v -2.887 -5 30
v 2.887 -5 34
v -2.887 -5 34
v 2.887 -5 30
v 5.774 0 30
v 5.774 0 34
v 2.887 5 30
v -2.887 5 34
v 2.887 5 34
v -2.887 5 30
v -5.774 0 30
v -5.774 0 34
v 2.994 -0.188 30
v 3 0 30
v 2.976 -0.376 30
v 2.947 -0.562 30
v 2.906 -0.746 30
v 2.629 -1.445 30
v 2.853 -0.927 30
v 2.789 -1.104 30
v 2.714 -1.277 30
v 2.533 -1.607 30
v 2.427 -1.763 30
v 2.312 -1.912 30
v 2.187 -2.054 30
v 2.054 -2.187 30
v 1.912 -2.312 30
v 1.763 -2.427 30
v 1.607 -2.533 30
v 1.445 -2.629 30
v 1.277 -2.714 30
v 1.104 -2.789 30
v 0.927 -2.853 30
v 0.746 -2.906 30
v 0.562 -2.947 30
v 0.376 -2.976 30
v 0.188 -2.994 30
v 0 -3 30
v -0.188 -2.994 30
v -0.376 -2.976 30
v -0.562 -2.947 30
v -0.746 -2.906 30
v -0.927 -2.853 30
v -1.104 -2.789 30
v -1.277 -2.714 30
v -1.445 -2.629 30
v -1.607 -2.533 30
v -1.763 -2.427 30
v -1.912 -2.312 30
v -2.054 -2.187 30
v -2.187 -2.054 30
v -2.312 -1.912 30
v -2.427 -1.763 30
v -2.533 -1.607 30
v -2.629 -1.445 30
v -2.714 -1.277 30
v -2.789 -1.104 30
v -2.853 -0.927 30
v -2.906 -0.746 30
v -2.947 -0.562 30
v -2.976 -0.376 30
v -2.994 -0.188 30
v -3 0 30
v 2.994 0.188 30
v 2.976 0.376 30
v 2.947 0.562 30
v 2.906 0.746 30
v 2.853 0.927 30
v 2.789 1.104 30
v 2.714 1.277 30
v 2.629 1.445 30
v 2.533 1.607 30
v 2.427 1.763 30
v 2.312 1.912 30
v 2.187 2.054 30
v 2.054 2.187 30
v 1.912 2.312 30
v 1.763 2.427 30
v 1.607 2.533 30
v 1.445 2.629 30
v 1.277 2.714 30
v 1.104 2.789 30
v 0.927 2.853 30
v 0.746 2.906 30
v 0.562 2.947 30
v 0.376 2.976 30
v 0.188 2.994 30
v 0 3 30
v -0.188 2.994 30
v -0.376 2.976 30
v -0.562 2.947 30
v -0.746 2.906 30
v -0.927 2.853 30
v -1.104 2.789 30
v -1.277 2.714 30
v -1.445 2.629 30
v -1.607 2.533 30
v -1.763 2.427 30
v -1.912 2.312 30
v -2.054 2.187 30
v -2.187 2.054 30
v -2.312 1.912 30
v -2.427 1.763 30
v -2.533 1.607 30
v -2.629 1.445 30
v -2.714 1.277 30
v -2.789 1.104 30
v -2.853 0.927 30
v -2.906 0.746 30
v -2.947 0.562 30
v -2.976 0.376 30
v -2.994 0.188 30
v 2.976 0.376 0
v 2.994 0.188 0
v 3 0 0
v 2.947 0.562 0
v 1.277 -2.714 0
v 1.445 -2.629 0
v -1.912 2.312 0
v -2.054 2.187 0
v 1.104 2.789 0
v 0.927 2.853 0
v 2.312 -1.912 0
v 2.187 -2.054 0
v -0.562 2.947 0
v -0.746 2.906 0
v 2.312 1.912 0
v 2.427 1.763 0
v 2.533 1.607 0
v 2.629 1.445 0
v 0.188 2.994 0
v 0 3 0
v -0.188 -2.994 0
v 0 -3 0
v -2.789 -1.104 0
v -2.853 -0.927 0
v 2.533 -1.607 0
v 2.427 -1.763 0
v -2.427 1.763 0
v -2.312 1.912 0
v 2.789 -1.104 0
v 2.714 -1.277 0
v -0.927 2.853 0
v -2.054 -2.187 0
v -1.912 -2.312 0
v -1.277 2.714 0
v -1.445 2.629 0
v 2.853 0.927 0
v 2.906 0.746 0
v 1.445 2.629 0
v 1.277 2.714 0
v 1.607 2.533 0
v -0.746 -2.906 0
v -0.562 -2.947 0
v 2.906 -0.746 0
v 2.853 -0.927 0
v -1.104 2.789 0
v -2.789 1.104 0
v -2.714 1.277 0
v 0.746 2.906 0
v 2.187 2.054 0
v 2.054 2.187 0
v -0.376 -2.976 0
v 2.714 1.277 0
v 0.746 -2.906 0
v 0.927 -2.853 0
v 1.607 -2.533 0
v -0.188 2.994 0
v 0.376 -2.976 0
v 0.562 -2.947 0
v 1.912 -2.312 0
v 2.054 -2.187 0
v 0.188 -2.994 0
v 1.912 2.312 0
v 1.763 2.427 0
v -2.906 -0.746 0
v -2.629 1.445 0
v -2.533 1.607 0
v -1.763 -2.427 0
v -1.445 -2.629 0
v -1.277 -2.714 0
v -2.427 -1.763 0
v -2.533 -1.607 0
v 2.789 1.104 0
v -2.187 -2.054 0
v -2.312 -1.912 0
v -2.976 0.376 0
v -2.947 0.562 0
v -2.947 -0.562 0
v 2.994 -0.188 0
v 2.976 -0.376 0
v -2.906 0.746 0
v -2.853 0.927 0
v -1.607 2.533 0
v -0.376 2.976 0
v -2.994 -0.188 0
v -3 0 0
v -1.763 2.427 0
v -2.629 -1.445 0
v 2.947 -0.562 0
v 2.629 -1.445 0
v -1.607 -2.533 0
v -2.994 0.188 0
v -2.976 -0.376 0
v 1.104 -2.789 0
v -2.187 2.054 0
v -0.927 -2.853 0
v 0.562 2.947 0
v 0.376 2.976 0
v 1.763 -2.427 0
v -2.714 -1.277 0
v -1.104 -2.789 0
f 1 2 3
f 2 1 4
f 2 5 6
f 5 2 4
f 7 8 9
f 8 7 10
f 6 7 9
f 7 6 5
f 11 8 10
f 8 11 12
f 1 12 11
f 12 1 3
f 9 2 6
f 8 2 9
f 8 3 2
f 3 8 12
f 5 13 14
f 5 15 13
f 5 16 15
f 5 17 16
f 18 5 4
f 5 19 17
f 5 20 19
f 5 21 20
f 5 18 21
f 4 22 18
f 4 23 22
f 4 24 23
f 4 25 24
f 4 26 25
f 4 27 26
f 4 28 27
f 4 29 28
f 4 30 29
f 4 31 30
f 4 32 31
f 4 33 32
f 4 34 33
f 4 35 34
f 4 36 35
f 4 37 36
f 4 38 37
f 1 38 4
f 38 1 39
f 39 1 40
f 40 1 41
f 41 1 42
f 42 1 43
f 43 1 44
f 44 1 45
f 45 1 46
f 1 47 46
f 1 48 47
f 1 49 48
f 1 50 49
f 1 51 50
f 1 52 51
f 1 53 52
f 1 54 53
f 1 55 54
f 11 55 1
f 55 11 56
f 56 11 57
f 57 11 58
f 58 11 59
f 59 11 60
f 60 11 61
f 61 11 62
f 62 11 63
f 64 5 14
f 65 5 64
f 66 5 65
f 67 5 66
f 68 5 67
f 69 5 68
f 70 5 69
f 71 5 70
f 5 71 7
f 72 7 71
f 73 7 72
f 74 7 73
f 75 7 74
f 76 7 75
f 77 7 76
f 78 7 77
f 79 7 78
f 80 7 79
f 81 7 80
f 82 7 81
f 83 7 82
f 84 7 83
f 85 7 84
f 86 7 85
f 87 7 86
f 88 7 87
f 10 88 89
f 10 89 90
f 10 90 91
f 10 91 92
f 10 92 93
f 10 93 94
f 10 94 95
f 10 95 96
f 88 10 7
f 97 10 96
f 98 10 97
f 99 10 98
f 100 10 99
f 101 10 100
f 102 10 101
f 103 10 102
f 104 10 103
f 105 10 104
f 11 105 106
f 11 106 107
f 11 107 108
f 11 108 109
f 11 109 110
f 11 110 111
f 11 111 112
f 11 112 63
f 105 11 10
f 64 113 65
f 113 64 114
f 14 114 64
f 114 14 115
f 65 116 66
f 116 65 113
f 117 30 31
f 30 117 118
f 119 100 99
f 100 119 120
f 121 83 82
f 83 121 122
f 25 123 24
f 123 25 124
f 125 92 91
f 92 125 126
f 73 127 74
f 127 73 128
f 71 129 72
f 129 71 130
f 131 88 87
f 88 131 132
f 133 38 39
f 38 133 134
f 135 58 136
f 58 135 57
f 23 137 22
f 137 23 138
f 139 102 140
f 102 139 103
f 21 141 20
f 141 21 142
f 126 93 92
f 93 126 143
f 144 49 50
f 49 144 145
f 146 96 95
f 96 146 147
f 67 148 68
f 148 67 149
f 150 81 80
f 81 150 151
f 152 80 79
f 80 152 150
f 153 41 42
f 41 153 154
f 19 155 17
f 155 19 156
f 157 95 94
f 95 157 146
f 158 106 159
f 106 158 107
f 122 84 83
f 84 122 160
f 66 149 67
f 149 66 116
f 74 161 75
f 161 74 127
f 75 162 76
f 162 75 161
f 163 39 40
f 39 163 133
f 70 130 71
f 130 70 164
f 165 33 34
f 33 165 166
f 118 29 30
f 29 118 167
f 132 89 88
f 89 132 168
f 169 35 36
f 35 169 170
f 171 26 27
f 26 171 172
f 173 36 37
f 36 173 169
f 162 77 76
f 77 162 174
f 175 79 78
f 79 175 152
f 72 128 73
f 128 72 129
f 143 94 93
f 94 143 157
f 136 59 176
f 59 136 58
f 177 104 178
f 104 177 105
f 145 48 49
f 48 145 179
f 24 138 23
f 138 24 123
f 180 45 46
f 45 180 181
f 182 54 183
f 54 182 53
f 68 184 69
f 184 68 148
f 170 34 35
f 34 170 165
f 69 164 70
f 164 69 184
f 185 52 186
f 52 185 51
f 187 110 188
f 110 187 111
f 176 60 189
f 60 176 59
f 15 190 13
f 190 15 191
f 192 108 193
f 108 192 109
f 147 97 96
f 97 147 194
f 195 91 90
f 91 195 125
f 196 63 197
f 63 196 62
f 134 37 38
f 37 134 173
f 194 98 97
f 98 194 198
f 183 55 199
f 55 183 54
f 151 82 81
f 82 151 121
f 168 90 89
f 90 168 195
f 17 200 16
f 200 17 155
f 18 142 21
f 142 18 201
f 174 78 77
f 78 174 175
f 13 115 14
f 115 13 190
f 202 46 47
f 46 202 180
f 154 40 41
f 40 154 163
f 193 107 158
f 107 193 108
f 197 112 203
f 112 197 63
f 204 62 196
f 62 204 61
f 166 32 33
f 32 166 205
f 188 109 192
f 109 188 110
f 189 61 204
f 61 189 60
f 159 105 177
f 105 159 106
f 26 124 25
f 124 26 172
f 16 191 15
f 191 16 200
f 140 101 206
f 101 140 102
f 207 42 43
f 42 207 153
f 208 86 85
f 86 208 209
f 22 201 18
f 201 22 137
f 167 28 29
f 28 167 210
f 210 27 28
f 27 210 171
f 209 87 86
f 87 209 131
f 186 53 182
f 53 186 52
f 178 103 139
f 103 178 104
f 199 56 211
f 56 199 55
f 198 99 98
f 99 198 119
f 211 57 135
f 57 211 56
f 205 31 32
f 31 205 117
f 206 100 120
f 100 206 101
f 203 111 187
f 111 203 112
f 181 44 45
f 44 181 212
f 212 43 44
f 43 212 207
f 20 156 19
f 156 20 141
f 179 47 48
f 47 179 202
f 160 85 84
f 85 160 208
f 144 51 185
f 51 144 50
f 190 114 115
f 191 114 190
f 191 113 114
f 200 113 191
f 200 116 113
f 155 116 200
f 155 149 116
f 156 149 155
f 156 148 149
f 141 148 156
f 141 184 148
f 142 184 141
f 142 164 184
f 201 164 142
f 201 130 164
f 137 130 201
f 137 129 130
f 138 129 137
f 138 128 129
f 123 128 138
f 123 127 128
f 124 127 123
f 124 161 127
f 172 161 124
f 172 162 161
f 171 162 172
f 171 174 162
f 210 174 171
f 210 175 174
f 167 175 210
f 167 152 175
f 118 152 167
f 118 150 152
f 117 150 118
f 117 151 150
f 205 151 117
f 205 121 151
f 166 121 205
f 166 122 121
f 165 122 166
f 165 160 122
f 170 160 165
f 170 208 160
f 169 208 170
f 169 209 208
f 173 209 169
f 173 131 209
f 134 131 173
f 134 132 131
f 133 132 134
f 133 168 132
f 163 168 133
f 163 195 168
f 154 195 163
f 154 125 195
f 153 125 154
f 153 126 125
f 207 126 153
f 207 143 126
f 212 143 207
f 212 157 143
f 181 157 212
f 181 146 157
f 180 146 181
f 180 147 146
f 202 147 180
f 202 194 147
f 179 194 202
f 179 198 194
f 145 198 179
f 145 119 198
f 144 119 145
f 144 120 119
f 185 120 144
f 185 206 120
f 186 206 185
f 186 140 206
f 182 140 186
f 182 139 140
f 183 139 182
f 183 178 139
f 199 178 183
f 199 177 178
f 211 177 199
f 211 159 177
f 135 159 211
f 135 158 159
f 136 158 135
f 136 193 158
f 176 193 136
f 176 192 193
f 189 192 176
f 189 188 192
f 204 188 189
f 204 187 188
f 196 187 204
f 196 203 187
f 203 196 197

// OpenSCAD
// M6 Bolt with 10mm Hex Head
// Standard ISO 4014 / DIN 931 dimensions

$fn = 100;  // Smoothness

// Parameters
head_diameter = 10;      // 10mm across flats (hex head)
head_height = 4;         // Standard head height for M6
shank_diameter = 6;      // M6 thread
shank_length = 30;       // Total bolt length
thread_length = 20;      // Threaded portion length

// Hex head (circumscribed circle diameter for hex = across flats / cos(30))
head_radius = head_diameter / 2 / cos(30);

module bolt() {
    // Hex head
    translate([0, 0, shank_length])
        cylinder(h = head_height, r = head_radius, $fn = 6);
    
    // Shank (unthreaded portion)
    translate([0, 0, thread_length])
        cylinder(h = shank_length - thread_length, d = shank_diameter);
    
    // Threaded portion (simplified as cylinder with threads visual)
    cylinder(h = thread_length, d = shank_diameter);
}

// Render the bolt
bolt();
